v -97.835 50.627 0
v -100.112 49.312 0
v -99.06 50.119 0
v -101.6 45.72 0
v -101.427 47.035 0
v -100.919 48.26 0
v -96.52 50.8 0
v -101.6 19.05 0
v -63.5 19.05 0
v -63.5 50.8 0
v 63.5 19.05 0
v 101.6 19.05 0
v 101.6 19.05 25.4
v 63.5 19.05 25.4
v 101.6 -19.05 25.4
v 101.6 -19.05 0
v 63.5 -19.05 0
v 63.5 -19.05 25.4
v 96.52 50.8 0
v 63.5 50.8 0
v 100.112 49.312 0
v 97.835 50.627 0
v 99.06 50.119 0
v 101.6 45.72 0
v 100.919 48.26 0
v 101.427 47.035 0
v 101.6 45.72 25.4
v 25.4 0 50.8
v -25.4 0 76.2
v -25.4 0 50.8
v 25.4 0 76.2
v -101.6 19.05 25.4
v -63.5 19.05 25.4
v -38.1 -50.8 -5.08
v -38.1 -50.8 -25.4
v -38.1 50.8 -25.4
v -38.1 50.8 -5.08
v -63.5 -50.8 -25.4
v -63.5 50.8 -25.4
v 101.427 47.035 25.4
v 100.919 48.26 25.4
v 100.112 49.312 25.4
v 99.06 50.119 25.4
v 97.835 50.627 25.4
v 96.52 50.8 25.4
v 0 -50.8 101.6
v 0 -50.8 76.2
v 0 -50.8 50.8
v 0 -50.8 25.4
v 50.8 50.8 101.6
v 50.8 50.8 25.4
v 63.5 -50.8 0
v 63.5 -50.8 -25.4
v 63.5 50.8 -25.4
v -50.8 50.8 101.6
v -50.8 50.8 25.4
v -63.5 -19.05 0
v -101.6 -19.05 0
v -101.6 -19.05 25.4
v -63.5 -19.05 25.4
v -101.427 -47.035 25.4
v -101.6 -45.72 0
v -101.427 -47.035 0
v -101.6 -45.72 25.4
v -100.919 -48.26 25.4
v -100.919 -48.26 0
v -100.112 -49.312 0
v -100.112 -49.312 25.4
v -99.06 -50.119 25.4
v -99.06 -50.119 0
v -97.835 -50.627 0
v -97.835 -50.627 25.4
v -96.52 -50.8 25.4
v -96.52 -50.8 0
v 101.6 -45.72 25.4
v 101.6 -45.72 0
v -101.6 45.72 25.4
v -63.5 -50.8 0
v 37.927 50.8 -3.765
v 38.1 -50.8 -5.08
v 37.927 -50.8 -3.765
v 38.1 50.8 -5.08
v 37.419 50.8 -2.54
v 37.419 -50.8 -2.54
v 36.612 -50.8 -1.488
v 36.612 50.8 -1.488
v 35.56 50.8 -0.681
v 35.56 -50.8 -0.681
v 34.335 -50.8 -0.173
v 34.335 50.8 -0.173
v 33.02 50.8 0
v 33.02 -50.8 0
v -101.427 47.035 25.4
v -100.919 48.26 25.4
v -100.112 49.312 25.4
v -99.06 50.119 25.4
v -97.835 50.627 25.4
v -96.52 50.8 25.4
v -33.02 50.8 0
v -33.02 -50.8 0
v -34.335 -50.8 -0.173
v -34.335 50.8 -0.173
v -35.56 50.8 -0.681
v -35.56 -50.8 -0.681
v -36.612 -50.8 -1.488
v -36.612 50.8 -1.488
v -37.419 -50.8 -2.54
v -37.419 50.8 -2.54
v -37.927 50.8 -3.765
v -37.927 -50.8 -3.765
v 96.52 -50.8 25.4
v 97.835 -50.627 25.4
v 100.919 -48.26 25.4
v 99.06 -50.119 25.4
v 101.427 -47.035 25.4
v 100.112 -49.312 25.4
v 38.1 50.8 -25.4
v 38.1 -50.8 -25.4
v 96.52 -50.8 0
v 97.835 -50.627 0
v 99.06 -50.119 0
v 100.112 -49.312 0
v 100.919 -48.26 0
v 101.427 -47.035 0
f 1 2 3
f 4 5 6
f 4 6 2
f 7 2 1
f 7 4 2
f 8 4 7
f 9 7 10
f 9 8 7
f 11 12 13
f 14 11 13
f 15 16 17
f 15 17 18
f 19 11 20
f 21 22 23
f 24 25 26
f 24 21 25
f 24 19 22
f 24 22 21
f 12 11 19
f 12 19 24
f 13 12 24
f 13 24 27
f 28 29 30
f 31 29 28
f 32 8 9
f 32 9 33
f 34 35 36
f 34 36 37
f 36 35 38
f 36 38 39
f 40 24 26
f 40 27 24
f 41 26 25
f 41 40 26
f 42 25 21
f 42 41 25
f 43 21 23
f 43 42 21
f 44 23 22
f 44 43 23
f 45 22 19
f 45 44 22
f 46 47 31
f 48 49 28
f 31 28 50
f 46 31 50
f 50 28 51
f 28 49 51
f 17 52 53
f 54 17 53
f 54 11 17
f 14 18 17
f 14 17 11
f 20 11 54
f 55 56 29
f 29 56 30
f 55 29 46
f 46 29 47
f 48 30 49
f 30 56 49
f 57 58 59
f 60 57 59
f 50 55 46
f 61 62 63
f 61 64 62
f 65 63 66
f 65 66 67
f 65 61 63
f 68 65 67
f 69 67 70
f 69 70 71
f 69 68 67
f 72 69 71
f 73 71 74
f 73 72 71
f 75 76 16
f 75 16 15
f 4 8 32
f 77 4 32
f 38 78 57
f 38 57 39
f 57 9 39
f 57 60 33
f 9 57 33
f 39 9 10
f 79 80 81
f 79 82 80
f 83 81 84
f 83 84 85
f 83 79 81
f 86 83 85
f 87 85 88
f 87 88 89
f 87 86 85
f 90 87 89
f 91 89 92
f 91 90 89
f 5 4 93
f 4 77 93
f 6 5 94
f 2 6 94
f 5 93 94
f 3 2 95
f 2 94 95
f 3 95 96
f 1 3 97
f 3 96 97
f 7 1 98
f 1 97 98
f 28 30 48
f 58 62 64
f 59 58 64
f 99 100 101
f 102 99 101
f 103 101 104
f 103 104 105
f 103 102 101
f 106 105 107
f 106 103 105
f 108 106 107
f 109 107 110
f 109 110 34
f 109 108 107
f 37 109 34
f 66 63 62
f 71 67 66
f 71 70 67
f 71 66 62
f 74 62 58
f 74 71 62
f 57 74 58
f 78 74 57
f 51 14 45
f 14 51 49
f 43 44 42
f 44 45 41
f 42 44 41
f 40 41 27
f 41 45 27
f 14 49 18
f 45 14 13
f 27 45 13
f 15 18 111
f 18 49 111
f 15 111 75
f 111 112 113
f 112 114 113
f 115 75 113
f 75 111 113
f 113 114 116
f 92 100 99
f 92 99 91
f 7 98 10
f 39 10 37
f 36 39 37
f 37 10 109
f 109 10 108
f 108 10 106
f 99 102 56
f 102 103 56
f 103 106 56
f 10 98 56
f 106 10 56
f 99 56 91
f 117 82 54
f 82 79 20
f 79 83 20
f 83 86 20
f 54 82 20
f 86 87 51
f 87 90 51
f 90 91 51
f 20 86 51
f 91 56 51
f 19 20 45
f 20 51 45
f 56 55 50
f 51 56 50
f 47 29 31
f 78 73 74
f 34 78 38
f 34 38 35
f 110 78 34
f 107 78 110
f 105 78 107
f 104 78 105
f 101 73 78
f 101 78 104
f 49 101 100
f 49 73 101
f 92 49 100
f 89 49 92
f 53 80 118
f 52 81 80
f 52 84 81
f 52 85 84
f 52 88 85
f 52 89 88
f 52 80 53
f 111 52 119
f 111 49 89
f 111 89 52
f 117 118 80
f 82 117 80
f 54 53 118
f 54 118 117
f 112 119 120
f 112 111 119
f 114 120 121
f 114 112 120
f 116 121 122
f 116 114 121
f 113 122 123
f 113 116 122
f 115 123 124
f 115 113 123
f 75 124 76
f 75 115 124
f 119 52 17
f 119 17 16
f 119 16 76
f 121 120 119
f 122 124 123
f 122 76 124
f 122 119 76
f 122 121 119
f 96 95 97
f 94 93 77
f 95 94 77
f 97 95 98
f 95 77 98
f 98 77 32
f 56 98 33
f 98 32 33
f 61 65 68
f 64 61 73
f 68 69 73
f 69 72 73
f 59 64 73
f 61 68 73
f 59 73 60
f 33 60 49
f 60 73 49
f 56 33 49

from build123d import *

# Parameters (mm, degrees)
F0_W      = 203.2
F0_H      = 25.4
F1_DEPTH  = 50.8
F2_R      = 5.08
F4_DEPTH  = 76.2
F5_W      = 101.6
F5_H      = 25.4
F6_DEPTH  = 63.5
F7_W      = 50.8
F7_H      = 25.4
F8_DEPTH  = 50.801
F9_W      = 38.1
F9_H      = 25.4
F10_DEPTH = 38.1
F11_W     = 38.1
F11_H     = 25.4
F12_DEPTH = 38.1
F13_W     = 76.2
F13_H     = 25.4
F14_DEPTH = 101.601
F15_R     = 5.08


with BuildPart() as f1:
    # F0 (on Front) → F1 (new body, symmetric)
    with BuildSketch(Plane.XZ):
        with Locations((0, 12.7)):
            Rectangle(F0_W, F0_H)
    extrude(amount=F1_DEPTH, both=True)

    # F2
    f2_edges = [f1.edges().sort_by_distance(p)[0] for p in [
        (101.6, -50.8, 12.7),
        (101.6, 50.8, 12.7),
        (-101.6, -50.8, 12.7),
        (-101.6, 50.8, 12.7),
    ]]
    fillet(f2_edges, radius=F2_R)

    # F3 (on face) → F4 (join)
    with BuildSketch(Plane.XY.offset(25.4)):
        Polygon((50.8, 50.8), (-50.8, 50.8), (0, -50.8), align=None)
    extrude(amount=F4_DEPTH)

    # F5 (on Right) → F6 (join, symmetric)
    with BuildSketch(Plane.YZ):
        with Locations((0, -12.7)):
            Rectangle(F5_W, F5_H)
    extrude(amount=F6_DEPTH, both=True)

    # F7 (on Front) → F8 (cut, through all)
    with BuildSketch(Plane.XZ):
        with Locations((0, 63.5)):
            Rectangle(F7_W, F7_H)
    extrude(amount=F8_DEPTH, mode=Mode.SUBTRACT)

    # F9 (on face) → F10 (cut)
    with BuildSketch(Plane(origin=(-101.6, 0, 0), x_dir=(0, -1, 0), z_dir=(-1, 0, 0))):
        with Locations((0, 12.7)):
            Rectangle(F9_W, F9_H)
    extrude(amount=-F10_DEPTH, mode=Mode.SUBTRACT)

    # F11 (on face) → F12 (cut)
    with BuildSketch(Plane.YZ.offset(101.6)):
        with Locations((0, 12.7)):
            Rectangle(F11_W, F11_H)
    extrude(amount=-F12_DEPTH, mode=Mode.SUBTRACT)

    # F13 (on face) → F14 (cut, through all)
    with BuildSketch(Plane.XZ.offset(50.8)):
        with Locations((0, -12.7)):
            Rectangle(F13_W, F13_H)
    extrude(amount=-F14_DEPTH, mode=Mode.SUBTRACT)

    # F15
    f15_edges = [f1.edges().sort_by_distance(p)[0] for p in [
        (-38.1, 0, 0),
        (38.1, 0, 0),
    ]]
    fillet(f15_edges, radius=F15_R)


solid = f1.part
